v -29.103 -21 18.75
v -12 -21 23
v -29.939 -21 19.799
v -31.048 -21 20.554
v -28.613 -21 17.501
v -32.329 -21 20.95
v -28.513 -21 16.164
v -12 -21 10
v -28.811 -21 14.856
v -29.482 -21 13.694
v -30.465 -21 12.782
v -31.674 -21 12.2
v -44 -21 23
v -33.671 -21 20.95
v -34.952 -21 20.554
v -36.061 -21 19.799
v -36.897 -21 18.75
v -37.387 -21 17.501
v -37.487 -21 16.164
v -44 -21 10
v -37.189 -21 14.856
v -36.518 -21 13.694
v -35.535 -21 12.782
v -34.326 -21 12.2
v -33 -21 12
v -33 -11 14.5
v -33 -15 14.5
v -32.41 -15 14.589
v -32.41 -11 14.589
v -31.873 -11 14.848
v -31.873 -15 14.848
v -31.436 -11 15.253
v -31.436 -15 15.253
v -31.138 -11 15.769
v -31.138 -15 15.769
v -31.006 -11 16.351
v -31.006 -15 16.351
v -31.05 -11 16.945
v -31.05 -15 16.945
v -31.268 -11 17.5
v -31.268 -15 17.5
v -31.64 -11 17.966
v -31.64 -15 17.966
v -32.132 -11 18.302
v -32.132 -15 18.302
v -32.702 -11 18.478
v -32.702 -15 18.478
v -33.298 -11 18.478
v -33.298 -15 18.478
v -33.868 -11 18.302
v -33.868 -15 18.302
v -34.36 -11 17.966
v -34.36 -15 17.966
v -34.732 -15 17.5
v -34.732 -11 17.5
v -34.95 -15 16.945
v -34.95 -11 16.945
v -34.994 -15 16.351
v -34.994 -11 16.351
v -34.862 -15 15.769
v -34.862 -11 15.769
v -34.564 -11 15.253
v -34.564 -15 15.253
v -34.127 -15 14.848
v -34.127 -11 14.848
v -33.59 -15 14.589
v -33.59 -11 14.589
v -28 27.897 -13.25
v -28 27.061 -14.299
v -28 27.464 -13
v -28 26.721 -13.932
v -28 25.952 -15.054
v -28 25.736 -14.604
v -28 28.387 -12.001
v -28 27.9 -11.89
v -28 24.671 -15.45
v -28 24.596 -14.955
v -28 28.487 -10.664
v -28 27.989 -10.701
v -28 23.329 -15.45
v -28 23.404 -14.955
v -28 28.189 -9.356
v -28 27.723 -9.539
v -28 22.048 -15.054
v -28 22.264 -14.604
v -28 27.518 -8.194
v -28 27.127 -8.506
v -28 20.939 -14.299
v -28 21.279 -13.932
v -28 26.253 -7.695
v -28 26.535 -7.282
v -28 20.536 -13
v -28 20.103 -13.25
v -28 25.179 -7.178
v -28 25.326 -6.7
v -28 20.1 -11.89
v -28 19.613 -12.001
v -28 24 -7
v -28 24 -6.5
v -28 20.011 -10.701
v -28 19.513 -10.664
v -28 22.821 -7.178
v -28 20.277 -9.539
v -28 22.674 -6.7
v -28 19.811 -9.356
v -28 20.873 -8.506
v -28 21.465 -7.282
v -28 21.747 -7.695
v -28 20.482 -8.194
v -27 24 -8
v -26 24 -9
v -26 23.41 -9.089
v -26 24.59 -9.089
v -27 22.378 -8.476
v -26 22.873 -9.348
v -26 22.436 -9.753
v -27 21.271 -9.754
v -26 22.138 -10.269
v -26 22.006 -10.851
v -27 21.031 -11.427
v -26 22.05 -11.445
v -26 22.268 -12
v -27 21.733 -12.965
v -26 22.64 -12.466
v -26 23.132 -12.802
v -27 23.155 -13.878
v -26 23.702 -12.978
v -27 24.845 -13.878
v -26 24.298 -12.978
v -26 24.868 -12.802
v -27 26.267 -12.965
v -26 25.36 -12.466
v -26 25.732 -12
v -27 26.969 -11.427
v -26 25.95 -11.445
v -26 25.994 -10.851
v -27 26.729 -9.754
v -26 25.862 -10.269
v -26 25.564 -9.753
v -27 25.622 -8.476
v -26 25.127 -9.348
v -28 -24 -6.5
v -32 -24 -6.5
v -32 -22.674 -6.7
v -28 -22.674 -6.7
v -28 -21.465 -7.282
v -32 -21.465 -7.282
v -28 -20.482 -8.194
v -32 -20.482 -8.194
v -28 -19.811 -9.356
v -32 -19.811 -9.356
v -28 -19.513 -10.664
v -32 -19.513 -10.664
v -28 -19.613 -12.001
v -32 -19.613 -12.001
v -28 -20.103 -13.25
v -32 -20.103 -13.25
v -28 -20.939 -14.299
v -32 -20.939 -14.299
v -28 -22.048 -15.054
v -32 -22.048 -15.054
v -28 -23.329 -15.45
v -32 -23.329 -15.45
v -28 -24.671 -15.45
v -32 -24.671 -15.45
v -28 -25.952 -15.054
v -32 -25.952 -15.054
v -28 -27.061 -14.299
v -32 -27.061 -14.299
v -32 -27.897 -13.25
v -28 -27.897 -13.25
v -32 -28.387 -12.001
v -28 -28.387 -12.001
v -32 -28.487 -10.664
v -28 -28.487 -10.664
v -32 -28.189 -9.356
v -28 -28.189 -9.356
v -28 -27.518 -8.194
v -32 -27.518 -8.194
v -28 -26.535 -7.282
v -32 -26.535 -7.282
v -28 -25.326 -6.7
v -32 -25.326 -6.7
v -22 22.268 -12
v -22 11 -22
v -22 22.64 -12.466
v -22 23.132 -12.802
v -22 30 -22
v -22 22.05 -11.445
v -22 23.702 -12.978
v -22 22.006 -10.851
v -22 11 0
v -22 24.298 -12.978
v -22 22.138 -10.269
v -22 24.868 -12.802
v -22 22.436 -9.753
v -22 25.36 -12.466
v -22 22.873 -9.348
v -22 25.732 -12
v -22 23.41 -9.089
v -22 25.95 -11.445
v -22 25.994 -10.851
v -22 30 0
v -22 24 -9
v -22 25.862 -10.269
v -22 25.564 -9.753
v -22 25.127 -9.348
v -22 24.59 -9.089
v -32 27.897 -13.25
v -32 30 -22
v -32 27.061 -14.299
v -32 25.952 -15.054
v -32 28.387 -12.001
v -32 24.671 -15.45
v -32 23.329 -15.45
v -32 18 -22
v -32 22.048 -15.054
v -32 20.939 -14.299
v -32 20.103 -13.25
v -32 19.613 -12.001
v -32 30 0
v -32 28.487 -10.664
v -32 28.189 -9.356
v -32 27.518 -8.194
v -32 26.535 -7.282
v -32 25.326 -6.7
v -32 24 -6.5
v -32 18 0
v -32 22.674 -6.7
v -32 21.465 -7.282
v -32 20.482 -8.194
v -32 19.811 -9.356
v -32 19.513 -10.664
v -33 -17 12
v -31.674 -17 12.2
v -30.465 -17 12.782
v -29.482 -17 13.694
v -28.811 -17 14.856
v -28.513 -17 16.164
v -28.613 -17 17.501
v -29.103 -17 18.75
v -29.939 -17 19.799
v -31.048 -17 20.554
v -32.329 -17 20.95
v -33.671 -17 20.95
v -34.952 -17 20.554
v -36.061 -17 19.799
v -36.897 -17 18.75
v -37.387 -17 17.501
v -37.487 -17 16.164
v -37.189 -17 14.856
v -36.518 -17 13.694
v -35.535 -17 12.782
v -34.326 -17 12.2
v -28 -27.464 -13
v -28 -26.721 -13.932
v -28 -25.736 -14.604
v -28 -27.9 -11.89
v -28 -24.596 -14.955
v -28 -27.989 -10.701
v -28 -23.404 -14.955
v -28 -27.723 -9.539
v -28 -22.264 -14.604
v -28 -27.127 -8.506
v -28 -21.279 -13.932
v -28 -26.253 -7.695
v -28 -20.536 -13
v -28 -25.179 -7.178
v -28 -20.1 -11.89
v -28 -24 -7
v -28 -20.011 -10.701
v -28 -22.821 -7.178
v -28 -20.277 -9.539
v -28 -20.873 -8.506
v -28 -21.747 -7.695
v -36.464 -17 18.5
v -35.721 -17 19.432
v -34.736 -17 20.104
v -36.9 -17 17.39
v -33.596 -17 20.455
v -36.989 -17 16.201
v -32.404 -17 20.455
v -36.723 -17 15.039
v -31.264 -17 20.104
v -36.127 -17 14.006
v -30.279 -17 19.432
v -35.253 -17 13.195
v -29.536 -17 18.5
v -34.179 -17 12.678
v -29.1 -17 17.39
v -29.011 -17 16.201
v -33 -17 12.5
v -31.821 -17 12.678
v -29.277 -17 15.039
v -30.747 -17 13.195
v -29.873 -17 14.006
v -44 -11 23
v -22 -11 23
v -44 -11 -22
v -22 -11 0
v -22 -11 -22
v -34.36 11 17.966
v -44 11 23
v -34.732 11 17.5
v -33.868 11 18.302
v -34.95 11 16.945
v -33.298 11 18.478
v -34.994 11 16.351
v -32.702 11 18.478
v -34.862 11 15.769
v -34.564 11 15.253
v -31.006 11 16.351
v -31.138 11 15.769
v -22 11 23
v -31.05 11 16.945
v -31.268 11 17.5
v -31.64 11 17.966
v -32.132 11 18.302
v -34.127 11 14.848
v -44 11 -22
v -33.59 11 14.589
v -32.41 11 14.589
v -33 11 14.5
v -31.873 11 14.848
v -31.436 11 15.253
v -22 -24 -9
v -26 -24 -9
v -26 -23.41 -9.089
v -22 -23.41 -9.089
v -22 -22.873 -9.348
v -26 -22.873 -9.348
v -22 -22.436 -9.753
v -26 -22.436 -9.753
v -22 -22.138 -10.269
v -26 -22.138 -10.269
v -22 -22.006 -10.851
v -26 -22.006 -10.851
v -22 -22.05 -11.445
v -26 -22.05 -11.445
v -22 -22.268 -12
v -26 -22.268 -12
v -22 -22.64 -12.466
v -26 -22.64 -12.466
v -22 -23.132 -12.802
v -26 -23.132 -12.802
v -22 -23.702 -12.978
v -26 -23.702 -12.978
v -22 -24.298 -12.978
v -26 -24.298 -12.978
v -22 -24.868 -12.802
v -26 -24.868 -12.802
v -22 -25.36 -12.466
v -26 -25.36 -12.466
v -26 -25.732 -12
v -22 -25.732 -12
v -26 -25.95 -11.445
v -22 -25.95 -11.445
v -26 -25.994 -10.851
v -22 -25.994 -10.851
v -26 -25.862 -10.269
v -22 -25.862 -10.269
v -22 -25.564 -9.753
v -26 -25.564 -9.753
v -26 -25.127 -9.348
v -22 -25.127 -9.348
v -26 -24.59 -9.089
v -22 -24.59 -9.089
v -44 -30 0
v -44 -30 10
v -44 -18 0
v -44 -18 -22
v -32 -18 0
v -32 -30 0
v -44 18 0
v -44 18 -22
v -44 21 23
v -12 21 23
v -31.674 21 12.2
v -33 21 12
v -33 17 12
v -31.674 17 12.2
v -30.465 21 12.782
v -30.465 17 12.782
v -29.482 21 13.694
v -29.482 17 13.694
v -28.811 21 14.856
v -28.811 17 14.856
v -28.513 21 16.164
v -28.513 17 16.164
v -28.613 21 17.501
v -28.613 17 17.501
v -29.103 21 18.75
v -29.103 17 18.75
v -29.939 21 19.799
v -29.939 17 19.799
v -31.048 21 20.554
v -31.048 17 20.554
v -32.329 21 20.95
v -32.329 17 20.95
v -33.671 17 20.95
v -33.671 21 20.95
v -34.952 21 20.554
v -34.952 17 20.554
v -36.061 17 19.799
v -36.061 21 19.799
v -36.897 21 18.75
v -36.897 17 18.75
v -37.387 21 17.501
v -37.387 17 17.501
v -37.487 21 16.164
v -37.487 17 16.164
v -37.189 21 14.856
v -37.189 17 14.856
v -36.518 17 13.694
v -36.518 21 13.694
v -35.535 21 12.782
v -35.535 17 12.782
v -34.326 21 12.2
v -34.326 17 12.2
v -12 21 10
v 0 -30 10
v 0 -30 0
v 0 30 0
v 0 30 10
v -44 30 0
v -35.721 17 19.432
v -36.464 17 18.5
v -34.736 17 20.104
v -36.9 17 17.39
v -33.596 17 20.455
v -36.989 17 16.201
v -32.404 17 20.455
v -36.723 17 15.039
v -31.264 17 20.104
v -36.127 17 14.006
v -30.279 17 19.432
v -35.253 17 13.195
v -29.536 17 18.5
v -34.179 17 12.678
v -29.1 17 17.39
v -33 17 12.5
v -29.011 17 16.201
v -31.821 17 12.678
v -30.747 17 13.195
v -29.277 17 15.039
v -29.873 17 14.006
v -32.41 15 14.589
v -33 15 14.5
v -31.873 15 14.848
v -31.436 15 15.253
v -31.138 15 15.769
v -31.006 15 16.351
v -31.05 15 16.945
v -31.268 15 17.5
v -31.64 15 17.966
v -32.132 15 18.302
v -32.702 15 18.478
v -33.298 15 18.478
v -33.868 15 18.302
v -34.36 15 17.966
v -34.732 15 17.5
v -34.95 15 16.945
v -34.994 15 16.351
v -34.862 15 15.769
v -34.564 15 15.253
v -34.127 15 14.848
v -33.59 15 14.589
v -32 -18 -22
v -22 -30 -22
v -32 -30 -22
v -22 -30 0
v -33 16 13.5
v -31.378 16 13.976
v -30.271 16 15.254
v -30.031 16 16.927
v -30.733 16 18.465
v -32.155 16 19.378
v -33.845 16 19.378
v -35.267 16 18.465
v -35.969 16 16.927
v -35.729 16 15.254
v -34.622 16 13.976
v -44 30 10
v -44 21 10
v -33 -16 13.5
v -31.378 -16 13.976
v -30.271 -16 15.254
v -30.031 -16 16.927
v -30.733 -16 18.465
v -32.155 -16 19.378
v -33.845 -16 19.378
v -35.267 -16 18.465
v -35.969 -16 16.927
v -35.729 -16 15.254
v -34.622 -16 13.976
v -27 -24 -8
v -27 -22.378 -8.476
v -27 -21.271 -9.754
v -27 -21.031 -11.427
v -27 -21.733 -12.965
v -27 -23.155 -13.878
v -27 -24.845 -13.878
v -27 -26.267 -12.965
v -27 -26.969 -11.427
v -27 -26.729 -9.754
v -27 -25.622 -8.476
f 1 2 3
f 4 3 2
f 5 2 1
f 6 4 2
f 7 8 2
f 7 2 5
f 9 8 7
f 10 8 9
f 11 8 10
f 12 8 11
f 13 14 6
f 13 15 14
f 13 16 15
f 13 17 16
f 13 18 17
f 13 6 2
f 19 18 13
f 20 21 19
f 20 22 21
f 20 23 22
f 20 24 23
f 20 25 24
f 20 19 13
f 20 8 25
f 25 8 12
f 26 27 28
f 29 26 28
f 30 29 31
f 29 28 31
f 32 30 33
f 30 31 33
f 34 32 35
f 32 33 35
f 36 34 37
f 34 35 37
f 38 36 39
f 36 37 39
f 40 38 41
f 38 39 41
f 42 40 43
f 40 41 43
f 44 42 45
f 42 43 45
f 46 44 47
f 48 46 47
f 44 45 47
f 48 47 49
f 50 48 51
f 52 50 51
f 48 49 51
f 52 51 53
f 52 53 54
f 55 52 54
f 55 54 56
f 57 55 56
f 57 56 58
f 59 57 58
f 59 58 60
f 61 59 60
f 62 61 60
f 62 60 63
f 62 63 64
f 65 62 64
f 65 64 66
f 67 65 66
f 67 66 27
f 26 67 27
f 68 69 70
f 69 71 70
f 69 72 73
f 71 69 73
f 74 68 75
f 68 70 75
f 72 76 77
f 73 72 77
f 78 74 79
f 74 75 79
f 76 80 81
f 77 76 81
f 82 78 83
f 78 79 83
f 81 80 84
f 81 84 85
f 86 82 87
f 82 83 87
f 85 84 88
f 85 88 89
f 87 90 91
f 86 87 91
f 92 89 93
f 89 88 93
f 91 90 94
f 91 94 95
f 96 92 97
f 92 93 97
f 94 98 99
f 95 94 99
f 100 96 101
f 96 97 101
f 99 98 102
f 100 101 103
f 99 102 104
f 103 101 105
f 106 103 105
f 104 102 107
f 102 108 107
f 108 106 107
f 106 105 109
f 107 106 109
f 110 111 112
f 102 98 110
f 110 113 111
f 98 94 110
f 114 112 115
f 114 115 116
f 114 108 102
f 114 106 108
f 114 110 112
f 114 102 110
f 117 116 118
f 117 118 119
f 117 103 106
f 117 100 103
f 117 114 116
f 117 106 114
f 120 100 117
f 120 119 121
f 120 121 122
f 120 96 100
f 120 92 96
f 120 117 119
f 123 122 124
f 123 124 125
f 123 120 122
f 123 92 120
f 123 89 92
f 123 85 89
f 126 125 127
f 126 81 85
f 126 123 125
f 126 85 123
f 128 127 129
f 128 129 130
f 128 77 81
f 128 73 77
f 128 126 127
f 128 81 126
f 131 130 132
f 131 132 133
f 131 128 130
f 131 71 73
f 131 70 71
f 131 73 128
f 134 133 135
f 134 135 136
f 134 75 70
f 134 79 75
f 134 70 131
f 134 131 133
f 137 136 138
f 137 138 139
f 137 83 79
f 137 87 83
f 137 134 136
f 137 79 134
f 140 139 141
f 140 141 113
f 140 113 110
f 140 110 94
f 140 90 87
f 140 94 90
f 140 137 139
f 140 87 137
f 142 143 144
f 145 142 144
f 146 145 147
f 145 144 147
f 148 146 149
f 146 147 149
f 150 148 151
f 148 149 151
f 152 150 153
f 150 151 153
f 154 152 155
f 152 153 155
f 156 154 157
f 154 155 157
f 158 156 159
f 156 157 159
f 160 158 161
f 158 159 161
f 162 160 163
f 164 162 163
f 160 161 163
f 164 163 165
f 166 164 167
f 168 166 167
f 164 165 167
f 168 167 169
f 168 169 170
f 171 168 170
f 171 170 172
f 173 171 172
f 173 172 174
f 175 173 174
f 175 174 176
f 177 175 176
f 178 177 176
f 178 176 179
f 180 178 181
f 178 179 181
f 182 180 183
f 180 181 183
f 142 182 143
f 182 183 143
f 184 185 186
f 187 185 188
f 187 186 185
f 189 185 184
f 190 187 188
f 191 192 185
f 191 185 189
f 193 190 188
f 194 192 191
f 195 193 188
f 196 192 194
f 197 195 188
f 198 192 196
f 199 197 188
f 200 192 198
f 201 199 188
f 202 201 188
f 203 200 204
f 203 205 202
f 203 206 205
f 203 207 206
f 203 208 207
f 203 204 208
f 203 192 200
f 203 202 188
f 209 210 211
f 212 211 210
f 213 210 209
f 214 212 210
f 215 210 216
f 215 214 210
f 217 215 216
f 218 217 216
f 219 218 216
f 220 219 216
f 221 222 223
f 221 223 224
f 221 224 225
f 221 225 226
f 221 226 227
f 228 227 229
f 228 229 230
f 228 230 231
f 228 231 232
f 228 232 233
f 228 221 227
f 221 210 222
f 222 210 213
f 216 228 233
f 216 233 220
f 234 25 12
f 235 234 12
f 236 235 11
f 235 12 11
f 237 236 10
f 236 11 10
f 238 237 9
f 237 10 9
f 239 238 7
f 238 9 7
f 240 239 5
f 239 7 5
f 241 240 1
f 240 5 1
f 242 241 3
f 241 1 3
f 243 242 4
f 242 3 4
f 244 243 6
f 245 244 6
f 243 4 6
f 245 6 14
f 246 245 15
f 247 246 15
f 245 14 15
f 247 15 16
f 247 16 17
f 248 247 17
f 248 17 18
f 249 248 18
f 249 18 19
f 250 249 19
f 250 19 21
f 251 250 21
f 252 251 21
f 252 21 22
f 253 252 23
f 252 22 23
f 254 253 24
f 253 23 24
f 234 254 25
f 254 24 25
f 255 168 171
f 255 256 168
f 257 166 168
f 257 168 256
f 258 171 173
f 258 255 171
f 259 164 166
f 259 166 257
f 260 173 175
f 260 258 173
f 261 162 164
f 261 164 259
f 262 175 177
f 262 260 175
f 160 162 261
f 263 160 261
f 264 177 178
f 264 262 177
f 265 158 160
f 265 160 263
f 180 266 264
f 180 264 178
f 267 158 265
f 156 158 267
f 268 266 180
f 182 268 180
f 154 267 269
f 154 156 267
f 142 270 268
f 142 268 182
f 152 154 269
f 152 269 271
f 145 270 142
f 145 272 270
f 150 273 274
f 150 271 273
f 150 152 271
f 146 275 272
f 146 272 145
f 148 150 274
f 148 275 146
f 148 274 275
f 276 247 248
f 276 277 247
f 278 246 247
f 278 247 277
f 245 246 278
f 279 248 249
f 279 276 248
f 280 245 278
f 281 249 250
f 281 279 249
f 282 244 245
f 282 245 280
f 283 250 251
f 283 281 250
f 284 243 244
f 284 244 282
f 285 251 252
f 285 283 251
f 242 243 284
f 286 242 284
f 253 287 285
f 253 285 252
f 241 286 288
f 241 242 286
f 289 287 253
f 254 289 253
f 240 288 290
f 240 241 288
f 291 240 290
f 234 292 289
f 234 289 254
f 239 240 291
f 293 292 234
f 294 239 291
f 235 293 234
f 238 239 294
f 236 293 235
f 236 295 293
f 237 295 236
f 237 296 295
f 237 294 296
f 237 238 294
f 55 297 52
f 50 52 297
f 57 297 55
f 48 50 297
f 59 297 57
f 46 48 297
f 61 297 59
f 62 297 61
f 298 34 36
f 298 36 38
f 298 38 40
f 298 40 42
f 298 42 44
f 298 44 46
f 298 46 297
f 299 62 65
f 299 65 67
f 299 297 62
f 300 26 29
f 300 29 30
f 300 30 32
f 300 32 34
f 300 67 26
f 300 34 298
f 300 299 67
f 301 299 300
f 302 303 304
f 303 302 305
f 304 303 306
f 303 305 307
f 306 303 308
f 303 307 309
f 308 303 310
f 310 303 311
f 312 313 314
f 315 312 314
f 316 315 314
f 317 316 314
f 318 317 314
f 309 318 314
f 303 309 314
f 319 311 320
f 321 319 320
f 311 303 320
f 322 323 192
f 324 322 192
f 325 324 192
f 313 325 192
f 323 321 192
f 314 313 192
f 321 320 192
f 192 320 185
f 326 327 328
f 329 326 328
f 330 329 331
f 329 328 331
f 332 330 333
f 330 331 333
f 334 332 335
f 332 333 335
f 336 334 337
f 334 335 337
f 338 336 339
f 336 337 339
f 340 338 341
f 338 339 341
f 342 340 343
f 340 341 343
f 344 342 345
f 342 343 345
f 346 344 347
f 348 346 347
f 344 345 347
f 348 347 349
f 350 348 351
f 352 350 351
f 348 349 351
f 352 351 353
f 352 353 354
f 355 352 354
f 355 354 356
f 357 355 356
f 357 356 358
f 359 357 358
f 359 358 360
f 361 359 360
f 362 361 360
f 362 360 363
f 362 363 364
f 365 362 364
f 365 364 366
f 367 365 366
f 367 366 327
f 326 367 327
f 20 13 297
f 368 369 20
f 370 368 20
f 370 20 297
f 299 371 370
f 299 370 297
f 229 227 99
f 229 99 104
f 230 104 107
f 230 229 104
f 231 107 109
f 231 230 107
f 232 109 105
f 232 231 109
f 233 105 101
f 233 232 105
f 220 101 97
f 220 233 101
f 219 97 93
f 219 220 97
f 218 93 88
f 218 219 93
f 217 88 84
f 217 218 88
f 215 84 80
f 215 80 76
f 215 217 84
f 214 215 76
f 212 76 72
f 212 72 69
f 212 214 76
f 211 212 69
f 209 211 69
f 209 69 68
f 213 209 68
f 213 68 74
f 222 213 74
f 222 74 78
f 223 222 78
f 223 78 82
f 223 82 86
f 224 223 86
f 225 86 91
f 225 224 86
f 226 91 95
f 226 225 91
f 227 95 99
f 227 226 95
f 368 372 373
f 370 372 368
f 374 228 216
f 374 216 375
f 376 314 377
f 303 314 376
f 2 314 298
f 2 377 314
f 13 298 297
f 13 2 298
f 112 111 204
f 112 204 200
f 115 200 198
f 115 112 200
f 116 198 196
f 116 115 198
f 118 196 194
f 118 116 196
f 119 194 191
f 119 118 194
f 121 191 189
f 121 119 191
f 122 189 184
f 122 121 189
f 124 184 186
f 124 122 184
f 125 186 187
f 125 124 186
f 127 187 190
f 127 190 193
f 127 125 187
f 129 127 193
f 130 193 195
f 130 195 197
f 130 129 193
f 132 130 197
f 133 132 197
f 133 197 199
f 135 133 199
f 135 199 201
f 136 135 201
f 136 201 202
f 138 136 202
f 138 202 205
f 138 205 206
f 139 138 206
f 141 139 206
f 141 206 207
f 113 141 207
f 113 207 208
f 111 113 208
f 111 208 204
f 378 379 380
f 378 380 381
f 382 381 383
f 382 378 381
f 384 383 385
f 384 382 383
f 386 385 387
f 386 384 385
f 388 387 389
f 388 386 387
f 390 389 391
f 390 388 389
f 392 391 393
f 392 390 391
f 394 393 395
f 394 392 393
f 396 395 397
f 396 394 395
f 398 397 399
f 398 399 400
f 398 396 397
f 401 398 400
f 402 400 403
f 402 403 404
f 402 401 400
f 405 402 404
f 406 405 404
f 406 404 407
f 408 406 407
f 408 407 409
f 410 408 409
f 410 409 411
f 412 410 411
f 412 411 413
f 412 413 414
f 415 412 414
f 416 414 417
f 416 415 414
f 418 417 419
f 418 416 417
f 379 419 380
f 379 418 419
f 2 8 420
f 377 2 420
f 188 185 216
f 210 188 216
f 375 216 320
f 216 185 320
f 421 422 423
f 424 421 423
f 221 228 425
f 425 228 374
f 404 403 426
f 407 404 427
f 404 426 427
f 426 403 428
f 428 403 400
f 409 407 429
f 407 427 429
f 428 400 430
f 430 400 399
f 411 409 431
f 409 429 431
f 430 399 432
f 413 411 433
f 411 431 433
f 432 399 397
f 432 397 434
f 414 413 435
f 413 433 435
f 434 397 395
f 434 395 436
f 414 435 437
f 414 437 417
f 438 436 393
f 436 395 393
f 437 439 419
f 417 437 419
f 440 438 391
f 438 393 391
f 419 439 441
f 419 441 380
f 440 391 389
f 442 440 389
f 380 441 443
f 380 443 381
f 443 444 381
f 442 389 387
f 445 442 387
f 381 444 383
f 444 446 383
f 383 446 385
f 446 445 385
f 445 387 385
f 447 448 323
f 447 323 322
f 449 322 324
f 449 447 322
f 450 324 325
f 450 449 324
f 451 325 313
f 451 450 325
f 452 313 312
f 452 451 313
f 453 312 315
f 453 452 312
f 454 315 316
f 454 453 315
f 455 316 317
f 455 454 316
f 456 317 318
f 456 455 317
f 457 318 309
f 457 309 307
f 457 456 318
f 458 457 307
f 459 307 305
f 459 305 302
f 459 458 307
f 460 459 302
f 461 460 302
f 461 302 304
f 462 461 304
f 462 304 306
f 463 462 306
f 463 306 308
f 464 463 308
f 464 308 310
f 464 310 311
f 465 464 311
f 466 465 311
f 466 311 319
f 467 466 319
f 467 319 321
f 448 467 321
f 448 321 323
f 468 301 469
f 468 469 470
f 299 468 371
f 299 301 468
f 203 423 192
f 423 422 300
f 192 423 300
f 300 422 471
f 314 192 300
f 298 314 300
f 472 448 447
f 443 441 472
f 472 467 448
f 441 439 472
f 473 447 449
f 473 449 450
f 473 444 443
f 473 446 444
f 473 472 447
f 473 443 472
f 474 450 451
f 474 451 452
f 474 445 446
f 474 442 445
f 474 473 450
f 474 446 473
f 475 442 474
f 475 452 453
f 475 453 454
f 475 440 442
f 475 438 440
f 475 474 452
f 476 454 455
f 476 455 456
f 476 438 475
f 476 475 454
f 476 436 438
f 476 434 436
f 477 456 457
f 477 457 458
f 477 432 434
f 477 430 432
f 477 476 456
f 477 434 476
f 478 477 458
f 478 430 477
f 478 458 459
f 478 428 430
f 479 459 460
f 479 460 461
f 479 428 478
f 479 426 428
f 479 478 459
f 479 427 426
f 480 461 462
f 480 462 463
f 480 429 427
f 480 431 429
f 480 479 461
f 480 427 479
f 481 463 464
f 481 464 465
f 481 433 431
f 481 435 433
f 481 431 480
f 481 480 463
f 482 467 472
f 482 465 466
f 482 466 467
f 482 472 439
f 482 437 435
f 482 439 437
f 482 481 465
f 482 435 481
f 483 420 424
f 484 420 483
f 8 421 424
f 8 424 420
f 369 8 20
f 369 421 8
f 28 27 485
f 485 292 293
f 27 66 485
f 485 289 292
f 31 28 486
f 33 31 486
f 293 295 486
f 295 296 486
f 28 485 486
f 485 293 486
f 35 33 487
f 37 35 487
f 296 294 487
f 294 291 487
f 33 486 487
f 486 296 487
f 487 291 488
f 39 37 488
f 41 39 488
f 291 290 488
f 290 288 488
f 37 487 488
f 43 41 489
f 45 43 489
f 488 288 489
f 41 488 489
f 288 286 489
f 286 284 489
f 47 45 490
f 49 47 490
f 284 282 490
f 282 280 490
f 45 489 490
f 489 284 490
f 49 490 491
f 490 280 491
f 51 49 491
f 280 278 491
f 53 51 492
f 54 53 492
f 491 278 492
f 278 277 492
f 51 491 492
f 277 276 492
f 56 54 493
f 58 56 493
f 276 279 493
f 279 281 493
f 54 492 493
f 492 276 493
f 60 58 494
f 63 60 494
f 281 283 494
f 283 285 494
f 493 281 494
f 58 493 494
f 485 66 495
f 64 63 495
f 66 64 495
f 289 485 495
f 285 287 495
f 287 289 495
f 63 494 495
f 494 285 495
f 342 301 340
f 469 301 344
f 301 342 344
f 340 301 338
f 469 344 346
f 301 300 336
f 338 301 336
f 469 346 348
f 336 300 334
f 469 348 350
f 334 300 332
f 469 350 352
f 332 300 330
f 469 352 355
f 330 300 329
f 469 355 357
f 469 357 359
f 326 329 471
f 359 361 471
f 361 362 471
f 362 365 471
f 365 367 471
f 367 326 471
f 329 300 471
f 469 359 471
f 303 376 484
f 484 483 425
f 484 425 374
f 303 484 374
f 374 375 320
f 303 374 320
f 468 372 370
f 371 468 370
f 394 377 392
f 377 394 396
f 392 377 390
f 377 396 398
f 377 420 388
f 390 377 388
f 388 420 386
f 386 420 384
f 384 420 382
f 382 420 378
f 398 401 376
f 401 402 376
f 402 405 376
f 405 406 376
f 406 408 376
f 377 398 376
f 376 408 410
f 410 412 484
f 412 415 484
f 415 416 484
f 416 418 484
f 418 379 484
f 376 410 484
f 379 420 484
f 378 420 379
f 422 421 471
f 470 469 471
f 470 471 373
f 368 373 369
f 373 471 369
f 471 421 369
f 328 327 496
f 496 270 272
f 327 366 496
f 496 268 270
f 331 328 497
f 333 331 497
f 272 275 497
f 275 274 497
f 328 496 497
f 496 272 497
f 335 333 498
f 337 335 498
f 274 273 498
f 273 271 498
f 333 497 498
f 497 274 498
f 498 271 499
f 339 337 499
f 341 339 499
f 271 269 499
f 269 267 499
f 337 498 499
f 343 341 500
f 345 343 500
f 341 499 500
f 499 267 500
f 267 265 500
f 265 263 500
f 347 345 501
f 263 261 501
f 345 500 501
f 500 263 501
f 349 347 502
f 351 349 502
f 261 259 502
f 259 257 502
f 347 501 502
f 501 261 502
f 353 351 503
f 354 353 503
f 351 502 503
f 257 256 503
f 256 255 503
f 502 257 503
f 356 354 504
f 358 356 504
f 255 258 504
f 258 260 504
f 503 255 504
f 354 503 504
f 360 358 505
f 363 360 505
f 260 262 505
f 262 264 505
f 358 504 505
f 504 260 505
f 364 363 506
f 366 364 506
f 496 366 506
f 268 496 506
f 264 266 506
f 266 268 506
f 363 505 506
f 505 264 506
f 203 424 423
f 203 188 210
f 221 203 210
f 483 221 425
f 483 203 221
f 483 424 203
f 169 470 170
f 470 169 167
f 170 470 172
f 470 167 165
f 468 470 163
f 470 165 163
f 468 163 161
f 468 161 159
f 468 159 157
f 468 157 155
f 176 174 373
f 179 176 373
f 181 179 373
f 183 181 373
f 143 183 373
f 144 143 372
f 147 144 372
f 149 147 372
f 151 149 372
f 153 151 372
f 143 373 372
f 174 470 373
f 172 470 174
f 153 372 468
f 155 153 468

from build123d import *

# Parameters (mm, degrees)
BOSS_EXTRUDE1_DEPTH = 10
BOSS_EXTRUDE2_DEPTH = 32
BOSS_EXTRUDE3_DEPTH = 13
SKETCH4_R           = 2
CUT_EXTRUDE1_DEPTH  = 54.907327888
SKETCH5_R           = 2
CUT_EXTRUDE2_DEPTH  = 50.527769988
SKETCH6_R           = 4.5
CUT_EXTRUDE3_DEPTH  = 4
SKETCH7_R           = 4.5
CUT_EXTRUDE4_DEPTH  = 4
CHAMFER2_SIZE       = 2


with BuildPart() as part:
    # Sketch1 → Boss-Extrude1 (new body)
    with BuildSketch(Plane.XY):
        Polygon((0, 0), (0, -30), (-44, -30), (-44, -11), (-22, -11), (-22, 0), align=None)
    extrude(amount=BOSS_EXTRUDE1_DEPTH)

    # Sketch2 → Boss-Extrude2 (add)
    with BuildSketch(Plane.XY.offset(10)):
        Polygon((-44, -11), (-22, -11), (-22, -30), (-32, -30), (-32, -18), (-44, -18), align=None)
    extrude(amount=-BOSS_EXTRUDE2_DEPTH)

    # Sketch3 → Boss-Extrude3 (add)
    with BuildSketch(Plane.XY.offset(10)):
        Polygon((-44, -11), (-22, -11), (-22, 0), (-12, 0), (-12, -21), (-44, -21), align=None)
    extrude(amount=BOSS_EXTRUDE3_DEPTH)

    # Sketch4 → Cut-Extrude1 (cut, through all)
    with BuildSketch(Plane.XZ.offset(21)):
        with Locations(Location((-33, 16.5, 0), (0, 0, 270))):
            Circle(SKETCH4_R)
    extrude(amount=-CUT_EXTRUDE1_DEPTH, mode=Mode.SUBTRACT)

    # Sketch5 → Cut-Extrude2 (cut, through all)
    with BuildSketch(Plane.ZY.offset(32)):
        with Locations((-11, -24)):
            Circle(SKETCH5_R)
    extrude(amount=-CUT_EXTRUDE2_DEPTH, mode=Mode.SUBTRACT)

    # Sketch6 → Cut-Extrude3 (cut)
    with BuildSketch(Plane.ZY.offset(32)):
        with Locations((-11, -24)):
            Circle(SKETCH6_R)
    extrude(amount=-CUT_EXTRUDE3_DEPTH, mode=Mode.SUBTRACT)

    # Sketch7 → Cut-Extrude4 (cut)
    with BuildSketch(Plane.XZ.offset(21)):
        with Locations(Location((-33, 16.5, 0), (0, 0, 270))):
            Circle(SKETCH7_R)
    extrude(amount=-CUT_EXTRUDE4_DEPTH, mode=Mode.SUBTRACT)

    # Chamfer2
    chamfer2_edges = [part.edges().sort_by_distance(p)[0] for p in [
        (-28, -24, -13),
        (-33, -17, 18.5),
    ]]
    chamfer(chamfer2_edges, length=CHAMFER2_SIZE)

    # Mirror1: part across plane


with BuildPart() as part_1:
    add(part.part)
    add(part.part.mirror(Plane(origin=(0, 0, 10), x_dir=(0, 0, 1), z_dir=(0, -1, 0))))


solid = part_1.part
